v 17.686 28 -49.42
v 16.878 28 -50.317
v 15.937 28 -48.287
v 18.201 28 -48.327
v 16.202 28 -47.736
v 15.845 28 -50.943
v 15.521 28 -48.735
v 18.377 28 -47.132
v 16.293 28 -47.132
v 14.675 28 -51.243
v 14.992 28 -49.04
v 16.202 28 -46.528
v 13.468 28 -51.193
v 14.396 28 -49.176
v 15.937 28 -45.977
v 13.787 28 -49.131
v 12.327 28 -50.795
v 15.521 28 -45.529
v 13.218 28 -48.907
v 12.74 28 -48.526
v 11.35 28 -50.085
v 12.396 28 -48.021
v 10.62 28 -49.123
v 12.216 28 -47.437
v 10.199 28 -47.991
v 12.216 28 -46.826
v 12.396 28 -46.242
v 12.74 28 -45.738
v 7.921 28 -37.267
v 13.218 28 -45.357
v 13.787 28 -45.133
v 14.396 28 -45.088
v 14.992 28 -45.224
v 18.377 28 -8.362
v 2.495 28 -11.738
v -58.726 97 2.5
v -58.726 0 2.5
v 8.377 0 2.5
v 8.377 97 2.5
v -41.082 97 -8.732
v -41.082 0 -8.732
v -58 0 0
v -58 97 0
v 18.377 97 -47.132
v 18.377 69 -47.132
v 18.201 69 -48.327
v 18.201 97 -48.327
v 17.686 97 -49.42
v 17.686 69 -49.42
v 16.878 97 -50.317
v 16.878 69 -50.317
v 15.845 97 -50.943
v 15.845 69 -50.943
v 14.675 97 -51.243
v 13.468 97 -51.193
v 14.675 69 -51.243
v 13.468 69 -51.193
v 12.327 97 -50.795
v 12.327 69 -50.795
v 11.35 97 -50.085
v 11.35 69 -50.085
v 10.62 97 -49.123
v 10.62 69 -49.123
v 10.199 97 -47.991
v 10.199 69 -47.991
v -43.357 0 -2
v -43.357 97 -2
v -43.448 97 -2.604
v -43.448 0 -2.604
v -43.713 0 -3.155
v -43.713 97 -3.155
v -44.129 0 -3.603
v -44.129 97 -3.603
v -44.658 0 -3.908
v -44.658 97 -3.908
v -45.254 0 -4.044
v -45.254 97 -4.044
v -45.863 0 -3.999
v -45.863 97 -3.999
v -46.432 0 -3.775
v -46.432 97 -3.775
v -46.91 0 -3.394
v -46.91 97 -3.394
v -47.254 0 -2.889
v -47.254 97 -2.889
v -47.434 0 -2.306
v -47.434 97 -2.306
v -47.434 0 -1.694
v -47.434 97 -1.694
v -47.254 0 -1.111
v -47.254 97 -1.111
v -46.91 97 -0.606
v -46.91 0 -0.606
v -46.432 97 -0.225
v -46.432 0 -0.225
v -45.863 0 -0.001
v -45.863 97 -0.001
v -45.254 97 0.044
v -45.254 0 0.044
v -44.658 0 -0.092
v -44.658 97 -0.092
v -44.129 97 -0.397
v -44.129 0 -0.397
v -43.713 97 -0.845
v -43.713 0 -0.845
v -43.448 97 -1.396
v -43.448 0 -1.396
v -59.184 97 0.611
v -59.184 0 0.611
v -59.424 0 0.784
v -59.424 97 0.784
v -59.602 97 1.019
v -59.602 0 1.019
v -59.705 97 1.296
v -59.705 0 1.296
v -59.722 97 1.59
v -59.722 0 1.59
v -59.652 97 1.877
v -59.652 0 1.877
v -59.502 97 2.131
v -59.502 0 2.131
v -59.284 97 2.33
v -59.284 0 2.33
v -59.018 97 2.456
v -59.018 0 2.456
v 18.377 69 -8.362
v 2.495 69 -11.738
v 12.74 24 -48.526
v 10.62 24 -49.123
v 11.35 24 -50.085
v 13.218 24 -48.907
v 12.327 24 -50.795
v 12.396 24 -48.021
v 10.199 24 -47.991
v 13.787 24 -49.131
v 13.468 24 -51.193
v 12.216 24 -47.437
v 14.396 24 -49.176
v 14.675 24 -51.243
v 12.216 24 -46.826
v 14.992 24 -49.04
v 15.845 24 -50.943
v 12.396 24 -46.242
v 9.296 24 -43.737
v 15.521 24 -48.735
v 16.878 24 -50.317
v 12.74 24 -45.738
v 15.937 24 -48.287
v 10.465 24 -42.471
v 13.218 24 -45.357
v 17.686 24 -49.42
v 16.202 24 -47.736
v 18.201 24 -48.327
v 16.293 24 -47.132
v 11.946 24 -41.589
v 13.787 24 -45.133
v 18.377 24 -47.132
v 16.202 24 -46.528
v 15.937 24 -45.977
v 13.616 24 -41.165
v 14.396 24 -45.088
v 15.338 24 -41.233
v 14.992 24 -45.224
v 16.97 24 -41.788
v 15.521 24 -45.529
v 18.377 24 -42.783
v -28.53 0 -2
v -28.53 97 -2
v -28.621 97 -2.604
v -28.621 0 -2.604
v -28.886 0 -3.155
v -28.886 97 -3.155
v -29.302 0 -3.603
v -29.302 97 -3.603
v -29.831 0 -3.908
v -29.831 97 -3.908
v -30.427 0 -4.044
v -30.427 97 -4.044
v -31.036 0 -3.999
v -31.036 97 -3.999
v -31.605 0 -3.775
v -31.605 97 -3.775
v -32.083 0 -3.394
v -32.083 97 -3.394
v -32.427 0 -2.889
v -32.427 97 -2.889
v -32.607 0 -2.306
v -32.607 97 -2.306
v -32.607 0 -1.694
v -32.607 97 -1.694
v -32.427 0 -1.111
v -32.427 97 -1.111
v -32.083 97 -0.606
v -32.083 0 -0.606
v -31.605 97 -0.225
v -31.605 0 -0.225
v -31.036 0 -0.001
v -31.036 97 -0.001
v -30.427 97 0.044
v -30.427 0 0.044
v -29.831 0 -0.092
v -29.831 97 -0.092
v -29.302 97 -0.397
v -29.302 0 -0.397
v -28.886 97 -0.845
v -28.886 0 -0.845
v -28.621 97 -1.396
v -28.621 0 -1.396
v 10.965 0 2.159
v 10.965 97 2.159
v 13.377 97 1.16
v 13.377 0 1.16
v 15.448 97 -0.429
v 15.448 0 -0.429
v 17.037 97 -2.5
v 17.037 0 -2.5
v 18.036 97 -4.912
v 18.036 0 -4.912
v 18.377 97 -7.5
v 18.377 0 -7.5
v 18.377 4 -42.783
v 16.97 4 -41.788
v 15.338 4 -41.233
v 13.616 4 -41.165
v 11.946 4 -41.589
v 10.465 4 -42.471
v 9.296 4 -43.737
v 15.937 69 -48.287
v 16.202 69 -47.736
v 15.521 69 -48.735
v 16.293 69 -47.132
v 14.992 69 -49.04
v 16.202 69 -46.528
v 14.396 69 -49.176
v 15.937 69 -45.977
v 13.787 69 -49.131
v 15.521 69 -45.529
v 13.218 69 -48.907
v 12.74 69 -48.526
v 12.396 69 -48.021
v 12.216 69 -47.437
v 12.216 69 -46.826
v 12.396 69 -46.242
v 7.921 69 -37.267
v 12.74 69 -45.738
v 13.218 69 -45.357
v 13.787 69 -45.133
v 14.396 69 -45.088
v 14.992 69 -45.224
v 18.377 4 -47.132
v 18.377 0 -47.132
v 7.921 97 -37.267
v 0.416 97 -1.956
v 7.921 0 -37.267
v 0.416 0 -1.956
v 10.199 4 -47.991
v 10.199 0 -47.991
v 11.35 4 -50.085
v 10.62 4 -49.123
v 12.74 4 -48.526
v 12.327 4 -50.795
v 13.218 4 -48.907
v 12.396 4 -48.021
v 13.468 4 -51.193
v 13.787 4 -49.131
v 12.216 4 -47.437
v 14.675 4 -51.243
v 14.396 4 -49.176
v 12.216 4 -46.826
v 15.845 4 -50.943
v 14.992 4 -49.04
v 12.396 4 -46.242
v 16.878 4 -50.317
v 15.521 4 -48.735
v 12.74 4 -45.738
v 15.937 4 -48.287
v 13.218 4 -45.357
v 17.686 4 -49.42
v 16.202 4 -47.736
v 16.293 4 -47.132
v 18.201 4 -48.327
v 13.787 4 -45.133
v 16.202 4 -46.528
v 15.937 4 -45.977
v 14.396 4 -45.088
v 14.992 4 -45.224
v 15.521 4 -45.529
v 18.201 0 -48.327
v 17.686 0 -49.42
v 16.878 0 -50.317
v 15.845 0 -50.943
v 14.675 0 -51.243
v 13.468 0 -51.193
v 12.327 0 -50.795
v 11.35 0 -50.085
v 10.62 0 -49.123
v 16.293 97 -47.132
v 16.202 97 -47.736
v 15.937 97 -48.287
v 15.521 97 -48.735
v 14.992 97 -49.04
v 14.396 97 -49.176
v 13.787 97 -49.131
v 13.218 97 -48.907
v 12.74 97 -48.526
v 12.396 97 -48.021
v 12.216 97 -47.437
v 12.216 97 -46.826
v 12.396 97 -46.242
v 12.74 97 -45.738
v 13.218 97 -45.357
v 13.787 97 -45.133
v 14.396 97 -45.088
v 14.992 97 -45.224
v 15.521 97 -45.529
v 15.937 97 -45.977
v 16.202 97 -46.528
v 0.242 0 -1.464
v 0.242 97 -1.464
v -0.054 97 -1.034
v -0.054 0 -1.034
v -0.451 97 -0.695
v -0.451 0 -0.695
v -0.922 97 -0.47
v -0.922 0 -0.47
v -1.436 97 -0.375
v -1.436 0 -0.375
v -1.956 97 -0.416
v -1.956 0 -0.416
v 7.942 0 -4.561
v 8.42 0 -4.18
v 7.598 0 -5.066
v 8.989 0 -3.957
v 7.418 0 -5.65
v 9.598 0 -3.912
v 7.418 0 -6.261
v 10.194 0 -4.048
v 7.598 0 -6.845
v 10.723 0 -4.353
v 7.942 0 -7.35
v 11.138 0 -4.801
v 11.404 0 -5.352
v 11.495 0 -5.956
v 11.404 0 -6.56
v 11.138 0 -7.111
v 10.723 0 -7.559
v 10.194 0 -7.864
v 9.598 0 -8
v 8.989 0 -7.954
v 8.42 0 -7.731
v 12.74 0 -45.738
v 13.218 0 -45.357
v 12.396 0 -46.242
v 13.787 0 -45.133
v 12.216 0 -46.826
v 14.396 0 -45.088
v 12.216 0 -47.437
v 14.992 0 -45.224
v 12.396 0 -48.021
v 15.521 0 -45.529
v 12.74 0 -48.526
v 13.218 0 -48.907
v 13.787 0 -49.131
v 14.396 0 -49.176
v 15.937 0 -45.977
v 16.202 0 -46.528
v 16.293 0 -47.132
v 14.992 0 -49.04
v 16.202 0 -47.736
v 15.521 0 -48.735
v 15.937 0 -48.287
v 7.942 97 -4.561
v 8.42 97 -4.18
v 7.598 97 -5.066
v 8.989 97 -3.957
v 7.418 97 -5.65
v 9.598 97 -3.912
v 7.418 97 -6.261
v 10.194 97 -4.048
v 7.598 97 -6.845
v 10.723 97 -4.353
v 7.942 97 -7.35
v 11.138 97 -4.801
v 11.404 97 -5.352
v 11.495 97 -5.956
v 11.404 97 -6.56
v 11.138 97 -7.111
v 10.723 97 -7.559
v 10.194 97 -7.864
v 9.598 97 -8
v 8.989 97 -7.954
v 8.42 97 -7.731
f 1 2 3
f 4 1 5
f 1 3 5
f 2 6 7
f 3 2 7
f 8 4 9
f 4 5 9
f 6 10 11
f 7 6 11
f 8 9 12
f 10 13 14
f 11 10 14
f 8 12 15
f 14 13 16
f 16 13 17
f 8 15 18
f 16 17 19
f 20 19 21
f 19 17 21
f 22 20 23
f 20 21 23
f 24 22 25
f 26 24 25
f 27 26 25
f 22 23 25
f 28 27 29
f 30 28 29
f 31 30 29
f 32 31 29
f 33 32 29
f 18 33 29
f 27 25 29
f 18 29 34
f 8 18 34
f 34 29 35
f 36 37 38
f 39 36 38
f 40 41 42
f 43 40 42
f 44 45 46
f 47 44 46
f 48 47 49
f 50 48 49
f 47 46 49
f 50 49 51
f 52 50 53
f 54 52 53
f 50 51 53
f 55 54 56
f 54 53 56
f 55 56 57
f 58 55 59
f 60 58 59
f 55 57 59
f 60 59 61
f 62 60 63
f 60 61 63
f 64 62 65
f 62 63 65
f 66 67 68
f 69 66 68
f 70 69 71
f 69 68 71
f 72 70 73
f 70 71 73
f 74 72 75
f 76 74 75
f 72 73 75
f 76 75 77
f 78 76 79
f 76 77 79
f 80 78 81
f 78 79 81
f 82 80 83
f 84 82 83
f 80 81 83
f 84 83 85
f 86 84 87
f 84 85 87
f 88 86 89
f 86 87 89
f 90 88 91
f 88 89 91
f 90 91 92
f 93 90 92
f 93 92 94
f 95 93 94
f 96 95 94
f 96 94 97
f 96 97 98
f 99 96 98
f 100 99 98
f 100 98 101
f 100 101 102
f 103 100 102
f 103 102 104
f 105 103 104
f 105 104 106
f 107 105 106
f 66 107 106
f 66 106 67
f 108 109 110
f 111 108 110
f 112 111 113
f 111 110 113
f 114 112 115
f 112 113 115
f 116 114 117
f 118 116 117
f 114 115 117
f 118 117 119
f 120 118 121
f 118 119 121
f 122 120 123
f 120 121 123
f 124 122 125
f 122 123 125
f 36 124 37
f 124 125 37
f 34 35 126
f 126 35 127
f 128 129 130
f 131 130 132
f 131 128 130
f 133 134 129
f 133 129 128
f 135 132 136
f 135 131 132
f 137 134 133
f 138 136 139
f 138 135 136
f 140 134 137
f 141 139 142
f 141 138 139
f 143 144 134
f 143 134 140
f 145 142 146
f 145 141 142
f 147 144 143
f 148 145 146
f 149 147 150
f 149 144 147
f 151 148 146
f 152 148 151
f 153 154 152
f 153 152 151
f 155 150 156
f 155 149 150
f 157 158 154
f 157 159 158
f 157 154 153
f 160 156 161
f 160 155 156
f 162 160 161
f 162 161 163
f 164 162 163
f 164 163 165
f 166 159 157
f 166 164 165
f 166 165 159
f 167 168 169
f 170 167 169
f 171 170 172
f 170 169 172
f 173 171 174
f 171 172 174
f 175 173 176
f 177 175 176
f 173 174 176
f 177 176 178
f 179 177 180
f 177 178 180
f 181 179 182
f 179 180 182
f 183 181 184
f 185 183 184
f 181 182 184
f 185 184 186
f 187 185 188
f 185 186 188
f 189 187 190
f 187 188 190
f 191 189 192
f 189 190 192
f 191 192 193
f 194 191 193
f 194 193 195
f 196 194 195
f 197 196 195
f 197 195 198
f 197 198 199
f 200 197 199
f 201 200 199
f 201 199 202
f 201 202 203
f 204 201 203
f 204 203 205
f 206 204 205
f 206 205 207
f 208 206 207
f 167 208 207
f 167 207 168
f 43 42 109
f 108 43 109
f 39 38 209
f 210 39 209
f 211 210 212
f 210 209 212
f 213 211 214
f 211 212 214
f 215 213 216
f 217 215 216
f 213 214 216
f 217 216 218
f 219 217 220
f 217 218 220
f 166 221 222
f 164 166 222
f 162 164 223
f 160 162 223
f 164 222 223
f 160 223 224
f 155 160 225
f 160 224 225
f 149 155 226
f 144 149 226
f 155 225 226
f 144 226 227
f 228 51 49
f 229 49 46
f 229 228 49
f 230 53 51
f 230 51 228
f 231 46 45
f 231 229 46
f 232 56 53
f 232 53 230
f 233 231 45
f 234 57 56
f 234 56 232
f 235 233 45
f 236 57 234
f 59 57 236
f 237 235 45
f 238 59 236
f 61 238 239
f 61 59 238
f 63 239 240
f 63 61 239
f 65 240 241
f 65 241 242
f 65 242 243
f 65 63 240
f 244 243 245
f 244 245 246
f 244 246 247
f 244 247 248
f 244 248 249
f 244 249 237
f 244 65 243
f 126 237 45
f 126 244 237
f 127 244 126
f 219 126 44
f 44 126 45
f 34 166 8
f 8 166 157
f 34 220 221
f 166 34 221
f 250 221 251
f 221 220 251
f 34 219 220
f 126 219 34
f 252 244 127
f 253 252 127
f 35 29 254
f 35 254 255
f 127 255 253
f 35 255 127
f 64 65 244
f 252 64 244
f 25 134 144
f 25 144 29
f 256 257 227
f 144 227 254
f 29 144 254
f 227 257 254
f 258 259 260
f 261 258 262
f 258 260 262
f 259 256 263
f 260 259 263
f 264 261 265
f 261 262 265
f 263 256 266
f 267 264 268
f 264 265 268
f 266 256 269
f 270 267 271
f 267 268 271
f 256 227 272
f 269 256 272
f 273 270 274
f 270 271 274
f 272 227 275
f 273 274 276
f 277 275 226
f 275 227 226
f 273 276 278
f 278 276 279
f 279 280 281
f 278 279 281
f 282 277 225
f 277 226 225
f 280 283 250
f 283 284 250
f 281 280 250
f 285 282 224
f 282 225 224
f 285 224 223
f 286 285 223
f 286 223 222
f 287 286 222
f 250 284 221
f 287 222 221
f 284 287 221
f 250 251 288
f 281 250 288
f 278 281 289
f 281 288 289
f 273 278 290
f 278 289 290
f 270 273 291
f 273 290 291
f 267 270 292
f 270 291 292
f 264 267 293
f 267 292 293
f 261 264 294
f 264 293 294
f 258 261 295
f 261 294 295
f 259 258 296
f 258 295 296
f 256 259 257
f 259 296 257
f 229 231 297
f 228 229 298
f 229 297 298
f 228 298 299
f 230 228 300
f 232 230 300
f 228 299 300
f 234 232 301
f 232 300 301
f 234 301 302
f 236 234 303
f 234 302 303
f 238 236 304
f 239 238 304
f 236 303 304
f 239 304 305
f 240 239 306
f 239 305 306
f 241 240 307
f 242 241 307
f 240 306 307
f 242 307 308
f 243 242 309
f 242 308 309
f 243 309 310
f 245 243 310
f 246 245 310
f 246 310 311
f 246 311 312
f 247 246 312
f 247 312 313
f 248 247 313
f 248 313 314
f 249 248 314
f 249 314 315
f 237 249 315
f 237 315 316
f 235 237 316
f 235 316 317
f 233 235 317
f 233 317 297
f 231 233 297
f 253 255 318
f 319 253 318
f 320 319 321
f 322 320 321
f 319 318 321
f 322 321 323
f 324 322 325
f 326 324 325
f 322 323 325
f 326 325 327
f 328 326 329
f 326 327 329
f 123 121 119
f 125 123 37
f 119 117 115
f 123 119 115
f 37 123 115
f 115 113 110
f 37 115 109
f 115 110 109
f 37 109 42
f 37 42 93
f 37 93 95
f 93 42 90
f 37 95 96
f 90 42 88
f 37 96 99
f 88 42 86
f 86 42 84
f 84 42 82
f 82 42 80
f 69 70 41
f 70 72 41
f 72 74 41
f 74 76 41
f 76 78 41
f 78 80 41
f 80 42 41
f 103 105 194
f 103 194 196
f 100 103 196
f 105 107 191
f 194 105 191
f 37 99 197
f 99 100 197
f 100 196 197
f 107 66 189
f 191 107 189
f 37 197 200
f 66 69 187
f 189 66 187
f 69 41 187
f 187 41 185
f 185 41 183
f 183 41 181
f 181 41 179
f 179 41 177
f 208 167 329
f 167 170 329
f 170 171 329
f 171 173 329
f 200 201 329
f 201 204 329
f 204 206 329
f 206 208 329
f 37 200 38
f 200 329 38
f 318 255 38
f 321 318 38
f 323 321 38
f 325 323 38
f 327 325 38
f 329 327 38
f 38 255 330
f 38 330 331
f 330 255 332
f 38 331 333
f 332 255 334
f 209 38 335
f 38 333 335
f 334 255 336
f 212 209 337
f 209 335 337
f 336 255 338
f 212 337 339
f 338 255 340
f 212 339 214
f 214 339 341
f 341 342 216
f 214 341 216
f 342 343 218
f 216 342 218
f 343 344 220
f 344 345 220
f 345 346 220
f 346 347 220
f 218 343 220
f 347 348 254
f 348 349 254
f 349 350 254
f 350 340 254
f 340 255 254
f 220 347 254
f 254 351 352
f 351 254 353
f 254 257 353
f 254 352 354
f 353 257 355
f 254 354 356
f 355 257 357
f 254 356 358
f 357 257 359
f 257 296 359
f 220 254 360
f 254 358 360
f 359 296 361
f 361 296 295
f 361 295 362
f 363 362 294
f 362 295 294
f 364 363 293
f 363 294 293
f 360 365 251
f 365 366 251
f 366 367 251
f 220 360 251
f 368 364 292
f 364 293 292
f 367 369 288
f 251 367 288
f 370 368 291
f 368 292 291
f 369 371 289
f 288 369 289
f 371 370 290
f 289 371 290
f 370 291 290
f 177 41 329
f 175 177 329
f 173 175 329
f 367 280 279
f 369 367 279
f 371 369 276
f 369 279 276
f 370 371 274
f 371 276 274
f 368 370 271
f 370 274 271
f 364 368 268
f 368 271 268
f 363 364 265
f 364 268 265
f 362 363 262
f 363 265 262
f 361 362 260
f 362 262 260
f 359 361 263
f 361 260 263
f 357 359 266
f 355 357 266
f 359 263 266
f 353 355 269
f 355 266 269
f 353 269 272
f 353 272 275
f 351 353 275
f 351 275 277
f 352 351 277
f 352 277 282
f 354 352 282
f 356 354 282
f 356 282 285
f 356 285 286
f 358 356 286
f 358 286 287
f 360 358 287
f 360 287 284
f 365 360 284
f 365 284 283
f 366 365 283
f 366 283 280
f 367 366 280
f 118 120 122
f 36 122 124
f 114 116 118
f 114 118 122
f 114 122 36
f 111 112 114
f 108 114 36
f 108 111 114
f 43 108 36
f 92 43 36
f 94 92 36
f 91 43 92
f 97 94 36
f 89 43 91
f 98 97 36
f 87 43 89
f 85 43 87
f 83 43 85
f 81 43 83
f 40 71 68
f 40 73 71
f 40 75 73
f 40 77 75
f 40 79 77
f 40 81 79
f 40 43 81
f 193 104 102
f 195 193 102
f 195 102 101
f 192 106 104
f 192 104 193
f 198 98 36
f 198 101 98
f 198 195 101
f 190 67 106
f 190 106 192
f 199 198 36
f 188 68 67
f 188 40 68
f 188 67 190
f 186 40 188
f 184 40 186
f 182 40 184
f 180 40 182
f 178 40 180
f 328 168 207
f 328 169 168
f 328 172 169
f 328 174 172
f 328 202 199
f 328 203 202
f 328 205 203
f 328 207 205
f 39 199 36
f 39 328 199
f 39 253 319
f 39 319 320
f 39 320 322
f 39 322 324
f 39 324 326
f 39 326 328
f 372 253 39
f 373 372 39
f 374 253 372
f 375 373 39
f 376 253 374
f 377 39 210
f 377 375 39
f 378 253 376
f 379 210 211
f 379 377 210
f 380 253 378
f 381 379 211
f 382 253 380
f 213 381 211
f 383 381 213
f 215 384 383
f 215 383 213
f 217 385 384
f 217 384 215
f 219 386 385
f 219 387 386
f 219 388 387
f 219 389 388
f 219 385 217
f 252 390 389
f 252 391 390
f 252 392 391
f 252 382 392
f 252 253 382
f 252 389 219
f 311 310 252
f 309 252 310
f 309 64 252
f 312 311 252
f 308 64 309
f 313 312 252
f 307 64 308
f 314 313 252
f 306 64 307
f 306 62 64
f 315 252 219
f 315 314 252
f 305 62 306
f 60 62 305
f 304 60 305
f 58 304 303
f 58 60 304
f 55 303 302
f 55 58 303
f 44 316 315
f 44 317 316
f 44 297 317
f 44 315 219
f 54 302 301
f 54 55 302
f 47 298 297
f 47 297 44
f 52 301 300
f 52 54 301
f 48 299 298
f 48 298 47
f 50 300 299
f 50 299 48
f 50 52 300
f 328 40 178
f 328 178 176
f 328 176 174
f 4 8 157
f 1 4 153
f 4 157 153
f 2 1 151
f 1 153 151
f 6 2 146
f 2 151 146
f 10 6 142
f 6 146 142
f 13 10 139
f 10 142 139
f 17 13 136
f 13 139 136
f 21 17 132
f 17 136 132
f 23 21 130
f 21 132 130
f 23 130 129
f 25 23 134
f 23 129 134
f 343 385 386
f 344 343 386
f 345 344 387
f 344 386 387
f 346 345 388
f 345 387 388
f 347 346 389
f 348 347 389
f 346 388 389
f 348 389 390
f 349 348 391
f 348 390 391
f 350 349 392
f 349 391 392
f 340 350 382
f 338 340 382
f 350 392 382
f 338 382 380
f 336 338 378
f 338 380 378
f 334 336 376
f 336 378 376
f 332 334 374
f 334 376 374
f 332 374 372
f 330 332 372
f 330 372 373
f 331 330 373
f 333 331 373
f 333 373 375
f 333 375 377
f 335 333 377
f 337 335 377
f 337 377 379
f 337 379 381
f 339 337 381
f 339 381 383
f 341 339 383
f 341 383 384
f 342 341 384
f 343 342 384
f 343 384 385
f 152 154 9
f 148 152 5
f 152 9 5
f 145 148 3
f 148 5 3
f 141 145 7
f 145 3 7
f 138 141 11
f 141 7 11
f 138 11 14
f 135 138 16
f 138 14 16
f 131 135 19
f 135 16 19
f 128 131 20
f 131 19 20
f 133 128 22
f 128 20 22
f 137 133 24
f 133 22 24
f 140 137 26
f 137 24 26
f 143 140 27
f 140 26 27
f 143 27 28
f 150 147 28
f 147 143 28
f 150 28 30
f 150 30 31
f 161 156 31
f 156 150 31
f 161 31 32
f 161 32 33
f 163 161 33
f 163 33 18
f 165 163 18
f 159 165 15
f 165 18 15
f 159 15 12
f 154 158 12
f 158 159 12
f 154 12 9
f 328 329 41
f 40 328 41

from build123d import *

# Parameters (mm, degrees)
BOSS_EXTRUDE1_DEPTH     = 97
SKETCH2_R               = 2.05
CUT_EXTRUDE1_DEPTH      = 98
SKETCH5_W               = 41.197318768
SKETCH5_H               = 41
CUT_EXTRUDE2_DEPTH      = 60.079477801
CUT_EXTRUDE2_DEPTH_BACK = 29.495236192
CUT_EXTRUDE4_START      = -4
SKETCH6_R               = 2.05
CUT_EXTRUDE4_DEPTH      = 20


with BuildPart() as part:
    # Sketch1 → Boss-Extrude1 (new body)
    with BuildSketch(Plane(origin=(0, 0, 0), x_dir=(1, 0, 0), z_dir=(0, 1, 0))):
        with BuildLine():
            Line((-1.956295201, 0.415823382), (-41.082199231, 8.732291014))
            Line((-41.082199231, 8.732291014), (-58, 0))
            Line((-58, 0), (-59.184498234, -0.611390536))
            ThreePointArc((-59.184498234, -0.611390536), (-59.697587059, -1.73599845), (-58.725833628, -2.5))
            Line((-58.725833628, -2.5), (7.92143542, -2.5))
            Line((7.92143542, -2.5), (8.377039367, -2.5))
            ThreePointArc((8.377039367, -2.5), (15.448107179, 0.428932188), (18.377039367, 7.5))
            Line((18.377039367, 7.5), (18.377039367, 47.131925559))
            ThreePointArc((18.377039367, 47.131925559), (14.674810753, 51.243366322), (10.199141157, 47.990855979))
            Line((10.199141157, 47.990855979), (7.92143542, 37.267423588))
            Line((7.92143542, 37.267423588), (0.415823382, 1.956295201))
            ThreePointArc((0.415823382, 1.956295201), (-0.45119375, 0.694777447), (-1.956295201, 0.415823382))
        make_face()
    extrude(amount=BOSS_EXTRUDE1_DEPTH)

    # Sketch2 → Cut-Extrude1 (cut, through all)
    with BuildSketch(Plane(origin=(0, 97, 0), x_dir=(1, 0, 0), z_dir=(0, 1, 0))):
        with Locations((-45.407004093, 2)):
            Circle(SKETCH2_R)
        with Locations((9.444671894, 5.955813006)):
            Circle(SKETCH2_R)
        with Locations((14.242983228, 47.131925559)):
            Circle(SKETCH2_R)
        with Locations((-30.580095712, 2)):
            Circle(SKETCH2_R)
    extrude(amount=-CUT_EXTRUDE1_DEPTH, mode=Mode.SUBTRACT)

    # Sketch5 → Cut-Extrude2 (cut, two sides)
    with BuildSketch(Plane(origin=(-9.781476007, 0, -2.079116908), x_dir=(-0.207911691, 0, 0.978147601), z_dir=(-0.978147601, 0, -0.207911691))) as cut_extrude2_sk:
        with Locations((-32.598659384, 48.5)):
            Rectangle(SKETCH5_W, SKETCH5_H)
    extrude(amount=CUT_EXTRUDE2_DEPTH, mode=Mode.SUBTRACT)
    extrude(cut_extrude2_sk.sketch, amount=-CUT_EXTRUDE2_DEPTH_BACK, mode=Mode.SUBTRACT)

    # Sketch6 → Cut-Extrude4 (cut)
    with BuildSketch(Plane.XZ.offset(CUT_EXTRUDE4_START)):
        with BuildLine():
            Line((18.377039367, -47.131925559), (18.377039367, -42.783410889))
            ThreePointArc((18.377039367, -42.783410889), (13.61624642, -41.164748591), (9.295652814, -43.737235327))
            Line((9.295652814, -43.737235327), (10.199141157, -47.990855979))
            ThreePointArc((10.199141157, -47.990855979), (14.674810753, -51.243366322), (18.377039367, -47.131925559))
        make_face()
        with Locations((14.242983228, -47.131925559)):
            Circle(SKETCH6_R, mode=Mode.SUBTRACT)
        with BuildLine():
            ThreePointArc((9.295652814, -43.737235327), (12.465904513, -52.862718807), (20.242983228, -47.131925559))
            ThreePointArc((20.242983228, -47.131925559), (19.756799367, -44.765951852), (18.377039367, -42.783410889))
            Line((18.377039367, -42.783410889), (18.377039367, -47.131925559))
            ThreePointArc((18.377039367, -47.131925559), (14.674810753, -51.243366322), (10.199141157, -47.990855979))
            Line((10.199141157, -47.990855979), (9.295652814, -43.737235327))
        make_face()
    extrude(amount=-CUT_EXTRUDE4_DEPTH, mode=Mode.SUBTRACT)


solid = part.part
